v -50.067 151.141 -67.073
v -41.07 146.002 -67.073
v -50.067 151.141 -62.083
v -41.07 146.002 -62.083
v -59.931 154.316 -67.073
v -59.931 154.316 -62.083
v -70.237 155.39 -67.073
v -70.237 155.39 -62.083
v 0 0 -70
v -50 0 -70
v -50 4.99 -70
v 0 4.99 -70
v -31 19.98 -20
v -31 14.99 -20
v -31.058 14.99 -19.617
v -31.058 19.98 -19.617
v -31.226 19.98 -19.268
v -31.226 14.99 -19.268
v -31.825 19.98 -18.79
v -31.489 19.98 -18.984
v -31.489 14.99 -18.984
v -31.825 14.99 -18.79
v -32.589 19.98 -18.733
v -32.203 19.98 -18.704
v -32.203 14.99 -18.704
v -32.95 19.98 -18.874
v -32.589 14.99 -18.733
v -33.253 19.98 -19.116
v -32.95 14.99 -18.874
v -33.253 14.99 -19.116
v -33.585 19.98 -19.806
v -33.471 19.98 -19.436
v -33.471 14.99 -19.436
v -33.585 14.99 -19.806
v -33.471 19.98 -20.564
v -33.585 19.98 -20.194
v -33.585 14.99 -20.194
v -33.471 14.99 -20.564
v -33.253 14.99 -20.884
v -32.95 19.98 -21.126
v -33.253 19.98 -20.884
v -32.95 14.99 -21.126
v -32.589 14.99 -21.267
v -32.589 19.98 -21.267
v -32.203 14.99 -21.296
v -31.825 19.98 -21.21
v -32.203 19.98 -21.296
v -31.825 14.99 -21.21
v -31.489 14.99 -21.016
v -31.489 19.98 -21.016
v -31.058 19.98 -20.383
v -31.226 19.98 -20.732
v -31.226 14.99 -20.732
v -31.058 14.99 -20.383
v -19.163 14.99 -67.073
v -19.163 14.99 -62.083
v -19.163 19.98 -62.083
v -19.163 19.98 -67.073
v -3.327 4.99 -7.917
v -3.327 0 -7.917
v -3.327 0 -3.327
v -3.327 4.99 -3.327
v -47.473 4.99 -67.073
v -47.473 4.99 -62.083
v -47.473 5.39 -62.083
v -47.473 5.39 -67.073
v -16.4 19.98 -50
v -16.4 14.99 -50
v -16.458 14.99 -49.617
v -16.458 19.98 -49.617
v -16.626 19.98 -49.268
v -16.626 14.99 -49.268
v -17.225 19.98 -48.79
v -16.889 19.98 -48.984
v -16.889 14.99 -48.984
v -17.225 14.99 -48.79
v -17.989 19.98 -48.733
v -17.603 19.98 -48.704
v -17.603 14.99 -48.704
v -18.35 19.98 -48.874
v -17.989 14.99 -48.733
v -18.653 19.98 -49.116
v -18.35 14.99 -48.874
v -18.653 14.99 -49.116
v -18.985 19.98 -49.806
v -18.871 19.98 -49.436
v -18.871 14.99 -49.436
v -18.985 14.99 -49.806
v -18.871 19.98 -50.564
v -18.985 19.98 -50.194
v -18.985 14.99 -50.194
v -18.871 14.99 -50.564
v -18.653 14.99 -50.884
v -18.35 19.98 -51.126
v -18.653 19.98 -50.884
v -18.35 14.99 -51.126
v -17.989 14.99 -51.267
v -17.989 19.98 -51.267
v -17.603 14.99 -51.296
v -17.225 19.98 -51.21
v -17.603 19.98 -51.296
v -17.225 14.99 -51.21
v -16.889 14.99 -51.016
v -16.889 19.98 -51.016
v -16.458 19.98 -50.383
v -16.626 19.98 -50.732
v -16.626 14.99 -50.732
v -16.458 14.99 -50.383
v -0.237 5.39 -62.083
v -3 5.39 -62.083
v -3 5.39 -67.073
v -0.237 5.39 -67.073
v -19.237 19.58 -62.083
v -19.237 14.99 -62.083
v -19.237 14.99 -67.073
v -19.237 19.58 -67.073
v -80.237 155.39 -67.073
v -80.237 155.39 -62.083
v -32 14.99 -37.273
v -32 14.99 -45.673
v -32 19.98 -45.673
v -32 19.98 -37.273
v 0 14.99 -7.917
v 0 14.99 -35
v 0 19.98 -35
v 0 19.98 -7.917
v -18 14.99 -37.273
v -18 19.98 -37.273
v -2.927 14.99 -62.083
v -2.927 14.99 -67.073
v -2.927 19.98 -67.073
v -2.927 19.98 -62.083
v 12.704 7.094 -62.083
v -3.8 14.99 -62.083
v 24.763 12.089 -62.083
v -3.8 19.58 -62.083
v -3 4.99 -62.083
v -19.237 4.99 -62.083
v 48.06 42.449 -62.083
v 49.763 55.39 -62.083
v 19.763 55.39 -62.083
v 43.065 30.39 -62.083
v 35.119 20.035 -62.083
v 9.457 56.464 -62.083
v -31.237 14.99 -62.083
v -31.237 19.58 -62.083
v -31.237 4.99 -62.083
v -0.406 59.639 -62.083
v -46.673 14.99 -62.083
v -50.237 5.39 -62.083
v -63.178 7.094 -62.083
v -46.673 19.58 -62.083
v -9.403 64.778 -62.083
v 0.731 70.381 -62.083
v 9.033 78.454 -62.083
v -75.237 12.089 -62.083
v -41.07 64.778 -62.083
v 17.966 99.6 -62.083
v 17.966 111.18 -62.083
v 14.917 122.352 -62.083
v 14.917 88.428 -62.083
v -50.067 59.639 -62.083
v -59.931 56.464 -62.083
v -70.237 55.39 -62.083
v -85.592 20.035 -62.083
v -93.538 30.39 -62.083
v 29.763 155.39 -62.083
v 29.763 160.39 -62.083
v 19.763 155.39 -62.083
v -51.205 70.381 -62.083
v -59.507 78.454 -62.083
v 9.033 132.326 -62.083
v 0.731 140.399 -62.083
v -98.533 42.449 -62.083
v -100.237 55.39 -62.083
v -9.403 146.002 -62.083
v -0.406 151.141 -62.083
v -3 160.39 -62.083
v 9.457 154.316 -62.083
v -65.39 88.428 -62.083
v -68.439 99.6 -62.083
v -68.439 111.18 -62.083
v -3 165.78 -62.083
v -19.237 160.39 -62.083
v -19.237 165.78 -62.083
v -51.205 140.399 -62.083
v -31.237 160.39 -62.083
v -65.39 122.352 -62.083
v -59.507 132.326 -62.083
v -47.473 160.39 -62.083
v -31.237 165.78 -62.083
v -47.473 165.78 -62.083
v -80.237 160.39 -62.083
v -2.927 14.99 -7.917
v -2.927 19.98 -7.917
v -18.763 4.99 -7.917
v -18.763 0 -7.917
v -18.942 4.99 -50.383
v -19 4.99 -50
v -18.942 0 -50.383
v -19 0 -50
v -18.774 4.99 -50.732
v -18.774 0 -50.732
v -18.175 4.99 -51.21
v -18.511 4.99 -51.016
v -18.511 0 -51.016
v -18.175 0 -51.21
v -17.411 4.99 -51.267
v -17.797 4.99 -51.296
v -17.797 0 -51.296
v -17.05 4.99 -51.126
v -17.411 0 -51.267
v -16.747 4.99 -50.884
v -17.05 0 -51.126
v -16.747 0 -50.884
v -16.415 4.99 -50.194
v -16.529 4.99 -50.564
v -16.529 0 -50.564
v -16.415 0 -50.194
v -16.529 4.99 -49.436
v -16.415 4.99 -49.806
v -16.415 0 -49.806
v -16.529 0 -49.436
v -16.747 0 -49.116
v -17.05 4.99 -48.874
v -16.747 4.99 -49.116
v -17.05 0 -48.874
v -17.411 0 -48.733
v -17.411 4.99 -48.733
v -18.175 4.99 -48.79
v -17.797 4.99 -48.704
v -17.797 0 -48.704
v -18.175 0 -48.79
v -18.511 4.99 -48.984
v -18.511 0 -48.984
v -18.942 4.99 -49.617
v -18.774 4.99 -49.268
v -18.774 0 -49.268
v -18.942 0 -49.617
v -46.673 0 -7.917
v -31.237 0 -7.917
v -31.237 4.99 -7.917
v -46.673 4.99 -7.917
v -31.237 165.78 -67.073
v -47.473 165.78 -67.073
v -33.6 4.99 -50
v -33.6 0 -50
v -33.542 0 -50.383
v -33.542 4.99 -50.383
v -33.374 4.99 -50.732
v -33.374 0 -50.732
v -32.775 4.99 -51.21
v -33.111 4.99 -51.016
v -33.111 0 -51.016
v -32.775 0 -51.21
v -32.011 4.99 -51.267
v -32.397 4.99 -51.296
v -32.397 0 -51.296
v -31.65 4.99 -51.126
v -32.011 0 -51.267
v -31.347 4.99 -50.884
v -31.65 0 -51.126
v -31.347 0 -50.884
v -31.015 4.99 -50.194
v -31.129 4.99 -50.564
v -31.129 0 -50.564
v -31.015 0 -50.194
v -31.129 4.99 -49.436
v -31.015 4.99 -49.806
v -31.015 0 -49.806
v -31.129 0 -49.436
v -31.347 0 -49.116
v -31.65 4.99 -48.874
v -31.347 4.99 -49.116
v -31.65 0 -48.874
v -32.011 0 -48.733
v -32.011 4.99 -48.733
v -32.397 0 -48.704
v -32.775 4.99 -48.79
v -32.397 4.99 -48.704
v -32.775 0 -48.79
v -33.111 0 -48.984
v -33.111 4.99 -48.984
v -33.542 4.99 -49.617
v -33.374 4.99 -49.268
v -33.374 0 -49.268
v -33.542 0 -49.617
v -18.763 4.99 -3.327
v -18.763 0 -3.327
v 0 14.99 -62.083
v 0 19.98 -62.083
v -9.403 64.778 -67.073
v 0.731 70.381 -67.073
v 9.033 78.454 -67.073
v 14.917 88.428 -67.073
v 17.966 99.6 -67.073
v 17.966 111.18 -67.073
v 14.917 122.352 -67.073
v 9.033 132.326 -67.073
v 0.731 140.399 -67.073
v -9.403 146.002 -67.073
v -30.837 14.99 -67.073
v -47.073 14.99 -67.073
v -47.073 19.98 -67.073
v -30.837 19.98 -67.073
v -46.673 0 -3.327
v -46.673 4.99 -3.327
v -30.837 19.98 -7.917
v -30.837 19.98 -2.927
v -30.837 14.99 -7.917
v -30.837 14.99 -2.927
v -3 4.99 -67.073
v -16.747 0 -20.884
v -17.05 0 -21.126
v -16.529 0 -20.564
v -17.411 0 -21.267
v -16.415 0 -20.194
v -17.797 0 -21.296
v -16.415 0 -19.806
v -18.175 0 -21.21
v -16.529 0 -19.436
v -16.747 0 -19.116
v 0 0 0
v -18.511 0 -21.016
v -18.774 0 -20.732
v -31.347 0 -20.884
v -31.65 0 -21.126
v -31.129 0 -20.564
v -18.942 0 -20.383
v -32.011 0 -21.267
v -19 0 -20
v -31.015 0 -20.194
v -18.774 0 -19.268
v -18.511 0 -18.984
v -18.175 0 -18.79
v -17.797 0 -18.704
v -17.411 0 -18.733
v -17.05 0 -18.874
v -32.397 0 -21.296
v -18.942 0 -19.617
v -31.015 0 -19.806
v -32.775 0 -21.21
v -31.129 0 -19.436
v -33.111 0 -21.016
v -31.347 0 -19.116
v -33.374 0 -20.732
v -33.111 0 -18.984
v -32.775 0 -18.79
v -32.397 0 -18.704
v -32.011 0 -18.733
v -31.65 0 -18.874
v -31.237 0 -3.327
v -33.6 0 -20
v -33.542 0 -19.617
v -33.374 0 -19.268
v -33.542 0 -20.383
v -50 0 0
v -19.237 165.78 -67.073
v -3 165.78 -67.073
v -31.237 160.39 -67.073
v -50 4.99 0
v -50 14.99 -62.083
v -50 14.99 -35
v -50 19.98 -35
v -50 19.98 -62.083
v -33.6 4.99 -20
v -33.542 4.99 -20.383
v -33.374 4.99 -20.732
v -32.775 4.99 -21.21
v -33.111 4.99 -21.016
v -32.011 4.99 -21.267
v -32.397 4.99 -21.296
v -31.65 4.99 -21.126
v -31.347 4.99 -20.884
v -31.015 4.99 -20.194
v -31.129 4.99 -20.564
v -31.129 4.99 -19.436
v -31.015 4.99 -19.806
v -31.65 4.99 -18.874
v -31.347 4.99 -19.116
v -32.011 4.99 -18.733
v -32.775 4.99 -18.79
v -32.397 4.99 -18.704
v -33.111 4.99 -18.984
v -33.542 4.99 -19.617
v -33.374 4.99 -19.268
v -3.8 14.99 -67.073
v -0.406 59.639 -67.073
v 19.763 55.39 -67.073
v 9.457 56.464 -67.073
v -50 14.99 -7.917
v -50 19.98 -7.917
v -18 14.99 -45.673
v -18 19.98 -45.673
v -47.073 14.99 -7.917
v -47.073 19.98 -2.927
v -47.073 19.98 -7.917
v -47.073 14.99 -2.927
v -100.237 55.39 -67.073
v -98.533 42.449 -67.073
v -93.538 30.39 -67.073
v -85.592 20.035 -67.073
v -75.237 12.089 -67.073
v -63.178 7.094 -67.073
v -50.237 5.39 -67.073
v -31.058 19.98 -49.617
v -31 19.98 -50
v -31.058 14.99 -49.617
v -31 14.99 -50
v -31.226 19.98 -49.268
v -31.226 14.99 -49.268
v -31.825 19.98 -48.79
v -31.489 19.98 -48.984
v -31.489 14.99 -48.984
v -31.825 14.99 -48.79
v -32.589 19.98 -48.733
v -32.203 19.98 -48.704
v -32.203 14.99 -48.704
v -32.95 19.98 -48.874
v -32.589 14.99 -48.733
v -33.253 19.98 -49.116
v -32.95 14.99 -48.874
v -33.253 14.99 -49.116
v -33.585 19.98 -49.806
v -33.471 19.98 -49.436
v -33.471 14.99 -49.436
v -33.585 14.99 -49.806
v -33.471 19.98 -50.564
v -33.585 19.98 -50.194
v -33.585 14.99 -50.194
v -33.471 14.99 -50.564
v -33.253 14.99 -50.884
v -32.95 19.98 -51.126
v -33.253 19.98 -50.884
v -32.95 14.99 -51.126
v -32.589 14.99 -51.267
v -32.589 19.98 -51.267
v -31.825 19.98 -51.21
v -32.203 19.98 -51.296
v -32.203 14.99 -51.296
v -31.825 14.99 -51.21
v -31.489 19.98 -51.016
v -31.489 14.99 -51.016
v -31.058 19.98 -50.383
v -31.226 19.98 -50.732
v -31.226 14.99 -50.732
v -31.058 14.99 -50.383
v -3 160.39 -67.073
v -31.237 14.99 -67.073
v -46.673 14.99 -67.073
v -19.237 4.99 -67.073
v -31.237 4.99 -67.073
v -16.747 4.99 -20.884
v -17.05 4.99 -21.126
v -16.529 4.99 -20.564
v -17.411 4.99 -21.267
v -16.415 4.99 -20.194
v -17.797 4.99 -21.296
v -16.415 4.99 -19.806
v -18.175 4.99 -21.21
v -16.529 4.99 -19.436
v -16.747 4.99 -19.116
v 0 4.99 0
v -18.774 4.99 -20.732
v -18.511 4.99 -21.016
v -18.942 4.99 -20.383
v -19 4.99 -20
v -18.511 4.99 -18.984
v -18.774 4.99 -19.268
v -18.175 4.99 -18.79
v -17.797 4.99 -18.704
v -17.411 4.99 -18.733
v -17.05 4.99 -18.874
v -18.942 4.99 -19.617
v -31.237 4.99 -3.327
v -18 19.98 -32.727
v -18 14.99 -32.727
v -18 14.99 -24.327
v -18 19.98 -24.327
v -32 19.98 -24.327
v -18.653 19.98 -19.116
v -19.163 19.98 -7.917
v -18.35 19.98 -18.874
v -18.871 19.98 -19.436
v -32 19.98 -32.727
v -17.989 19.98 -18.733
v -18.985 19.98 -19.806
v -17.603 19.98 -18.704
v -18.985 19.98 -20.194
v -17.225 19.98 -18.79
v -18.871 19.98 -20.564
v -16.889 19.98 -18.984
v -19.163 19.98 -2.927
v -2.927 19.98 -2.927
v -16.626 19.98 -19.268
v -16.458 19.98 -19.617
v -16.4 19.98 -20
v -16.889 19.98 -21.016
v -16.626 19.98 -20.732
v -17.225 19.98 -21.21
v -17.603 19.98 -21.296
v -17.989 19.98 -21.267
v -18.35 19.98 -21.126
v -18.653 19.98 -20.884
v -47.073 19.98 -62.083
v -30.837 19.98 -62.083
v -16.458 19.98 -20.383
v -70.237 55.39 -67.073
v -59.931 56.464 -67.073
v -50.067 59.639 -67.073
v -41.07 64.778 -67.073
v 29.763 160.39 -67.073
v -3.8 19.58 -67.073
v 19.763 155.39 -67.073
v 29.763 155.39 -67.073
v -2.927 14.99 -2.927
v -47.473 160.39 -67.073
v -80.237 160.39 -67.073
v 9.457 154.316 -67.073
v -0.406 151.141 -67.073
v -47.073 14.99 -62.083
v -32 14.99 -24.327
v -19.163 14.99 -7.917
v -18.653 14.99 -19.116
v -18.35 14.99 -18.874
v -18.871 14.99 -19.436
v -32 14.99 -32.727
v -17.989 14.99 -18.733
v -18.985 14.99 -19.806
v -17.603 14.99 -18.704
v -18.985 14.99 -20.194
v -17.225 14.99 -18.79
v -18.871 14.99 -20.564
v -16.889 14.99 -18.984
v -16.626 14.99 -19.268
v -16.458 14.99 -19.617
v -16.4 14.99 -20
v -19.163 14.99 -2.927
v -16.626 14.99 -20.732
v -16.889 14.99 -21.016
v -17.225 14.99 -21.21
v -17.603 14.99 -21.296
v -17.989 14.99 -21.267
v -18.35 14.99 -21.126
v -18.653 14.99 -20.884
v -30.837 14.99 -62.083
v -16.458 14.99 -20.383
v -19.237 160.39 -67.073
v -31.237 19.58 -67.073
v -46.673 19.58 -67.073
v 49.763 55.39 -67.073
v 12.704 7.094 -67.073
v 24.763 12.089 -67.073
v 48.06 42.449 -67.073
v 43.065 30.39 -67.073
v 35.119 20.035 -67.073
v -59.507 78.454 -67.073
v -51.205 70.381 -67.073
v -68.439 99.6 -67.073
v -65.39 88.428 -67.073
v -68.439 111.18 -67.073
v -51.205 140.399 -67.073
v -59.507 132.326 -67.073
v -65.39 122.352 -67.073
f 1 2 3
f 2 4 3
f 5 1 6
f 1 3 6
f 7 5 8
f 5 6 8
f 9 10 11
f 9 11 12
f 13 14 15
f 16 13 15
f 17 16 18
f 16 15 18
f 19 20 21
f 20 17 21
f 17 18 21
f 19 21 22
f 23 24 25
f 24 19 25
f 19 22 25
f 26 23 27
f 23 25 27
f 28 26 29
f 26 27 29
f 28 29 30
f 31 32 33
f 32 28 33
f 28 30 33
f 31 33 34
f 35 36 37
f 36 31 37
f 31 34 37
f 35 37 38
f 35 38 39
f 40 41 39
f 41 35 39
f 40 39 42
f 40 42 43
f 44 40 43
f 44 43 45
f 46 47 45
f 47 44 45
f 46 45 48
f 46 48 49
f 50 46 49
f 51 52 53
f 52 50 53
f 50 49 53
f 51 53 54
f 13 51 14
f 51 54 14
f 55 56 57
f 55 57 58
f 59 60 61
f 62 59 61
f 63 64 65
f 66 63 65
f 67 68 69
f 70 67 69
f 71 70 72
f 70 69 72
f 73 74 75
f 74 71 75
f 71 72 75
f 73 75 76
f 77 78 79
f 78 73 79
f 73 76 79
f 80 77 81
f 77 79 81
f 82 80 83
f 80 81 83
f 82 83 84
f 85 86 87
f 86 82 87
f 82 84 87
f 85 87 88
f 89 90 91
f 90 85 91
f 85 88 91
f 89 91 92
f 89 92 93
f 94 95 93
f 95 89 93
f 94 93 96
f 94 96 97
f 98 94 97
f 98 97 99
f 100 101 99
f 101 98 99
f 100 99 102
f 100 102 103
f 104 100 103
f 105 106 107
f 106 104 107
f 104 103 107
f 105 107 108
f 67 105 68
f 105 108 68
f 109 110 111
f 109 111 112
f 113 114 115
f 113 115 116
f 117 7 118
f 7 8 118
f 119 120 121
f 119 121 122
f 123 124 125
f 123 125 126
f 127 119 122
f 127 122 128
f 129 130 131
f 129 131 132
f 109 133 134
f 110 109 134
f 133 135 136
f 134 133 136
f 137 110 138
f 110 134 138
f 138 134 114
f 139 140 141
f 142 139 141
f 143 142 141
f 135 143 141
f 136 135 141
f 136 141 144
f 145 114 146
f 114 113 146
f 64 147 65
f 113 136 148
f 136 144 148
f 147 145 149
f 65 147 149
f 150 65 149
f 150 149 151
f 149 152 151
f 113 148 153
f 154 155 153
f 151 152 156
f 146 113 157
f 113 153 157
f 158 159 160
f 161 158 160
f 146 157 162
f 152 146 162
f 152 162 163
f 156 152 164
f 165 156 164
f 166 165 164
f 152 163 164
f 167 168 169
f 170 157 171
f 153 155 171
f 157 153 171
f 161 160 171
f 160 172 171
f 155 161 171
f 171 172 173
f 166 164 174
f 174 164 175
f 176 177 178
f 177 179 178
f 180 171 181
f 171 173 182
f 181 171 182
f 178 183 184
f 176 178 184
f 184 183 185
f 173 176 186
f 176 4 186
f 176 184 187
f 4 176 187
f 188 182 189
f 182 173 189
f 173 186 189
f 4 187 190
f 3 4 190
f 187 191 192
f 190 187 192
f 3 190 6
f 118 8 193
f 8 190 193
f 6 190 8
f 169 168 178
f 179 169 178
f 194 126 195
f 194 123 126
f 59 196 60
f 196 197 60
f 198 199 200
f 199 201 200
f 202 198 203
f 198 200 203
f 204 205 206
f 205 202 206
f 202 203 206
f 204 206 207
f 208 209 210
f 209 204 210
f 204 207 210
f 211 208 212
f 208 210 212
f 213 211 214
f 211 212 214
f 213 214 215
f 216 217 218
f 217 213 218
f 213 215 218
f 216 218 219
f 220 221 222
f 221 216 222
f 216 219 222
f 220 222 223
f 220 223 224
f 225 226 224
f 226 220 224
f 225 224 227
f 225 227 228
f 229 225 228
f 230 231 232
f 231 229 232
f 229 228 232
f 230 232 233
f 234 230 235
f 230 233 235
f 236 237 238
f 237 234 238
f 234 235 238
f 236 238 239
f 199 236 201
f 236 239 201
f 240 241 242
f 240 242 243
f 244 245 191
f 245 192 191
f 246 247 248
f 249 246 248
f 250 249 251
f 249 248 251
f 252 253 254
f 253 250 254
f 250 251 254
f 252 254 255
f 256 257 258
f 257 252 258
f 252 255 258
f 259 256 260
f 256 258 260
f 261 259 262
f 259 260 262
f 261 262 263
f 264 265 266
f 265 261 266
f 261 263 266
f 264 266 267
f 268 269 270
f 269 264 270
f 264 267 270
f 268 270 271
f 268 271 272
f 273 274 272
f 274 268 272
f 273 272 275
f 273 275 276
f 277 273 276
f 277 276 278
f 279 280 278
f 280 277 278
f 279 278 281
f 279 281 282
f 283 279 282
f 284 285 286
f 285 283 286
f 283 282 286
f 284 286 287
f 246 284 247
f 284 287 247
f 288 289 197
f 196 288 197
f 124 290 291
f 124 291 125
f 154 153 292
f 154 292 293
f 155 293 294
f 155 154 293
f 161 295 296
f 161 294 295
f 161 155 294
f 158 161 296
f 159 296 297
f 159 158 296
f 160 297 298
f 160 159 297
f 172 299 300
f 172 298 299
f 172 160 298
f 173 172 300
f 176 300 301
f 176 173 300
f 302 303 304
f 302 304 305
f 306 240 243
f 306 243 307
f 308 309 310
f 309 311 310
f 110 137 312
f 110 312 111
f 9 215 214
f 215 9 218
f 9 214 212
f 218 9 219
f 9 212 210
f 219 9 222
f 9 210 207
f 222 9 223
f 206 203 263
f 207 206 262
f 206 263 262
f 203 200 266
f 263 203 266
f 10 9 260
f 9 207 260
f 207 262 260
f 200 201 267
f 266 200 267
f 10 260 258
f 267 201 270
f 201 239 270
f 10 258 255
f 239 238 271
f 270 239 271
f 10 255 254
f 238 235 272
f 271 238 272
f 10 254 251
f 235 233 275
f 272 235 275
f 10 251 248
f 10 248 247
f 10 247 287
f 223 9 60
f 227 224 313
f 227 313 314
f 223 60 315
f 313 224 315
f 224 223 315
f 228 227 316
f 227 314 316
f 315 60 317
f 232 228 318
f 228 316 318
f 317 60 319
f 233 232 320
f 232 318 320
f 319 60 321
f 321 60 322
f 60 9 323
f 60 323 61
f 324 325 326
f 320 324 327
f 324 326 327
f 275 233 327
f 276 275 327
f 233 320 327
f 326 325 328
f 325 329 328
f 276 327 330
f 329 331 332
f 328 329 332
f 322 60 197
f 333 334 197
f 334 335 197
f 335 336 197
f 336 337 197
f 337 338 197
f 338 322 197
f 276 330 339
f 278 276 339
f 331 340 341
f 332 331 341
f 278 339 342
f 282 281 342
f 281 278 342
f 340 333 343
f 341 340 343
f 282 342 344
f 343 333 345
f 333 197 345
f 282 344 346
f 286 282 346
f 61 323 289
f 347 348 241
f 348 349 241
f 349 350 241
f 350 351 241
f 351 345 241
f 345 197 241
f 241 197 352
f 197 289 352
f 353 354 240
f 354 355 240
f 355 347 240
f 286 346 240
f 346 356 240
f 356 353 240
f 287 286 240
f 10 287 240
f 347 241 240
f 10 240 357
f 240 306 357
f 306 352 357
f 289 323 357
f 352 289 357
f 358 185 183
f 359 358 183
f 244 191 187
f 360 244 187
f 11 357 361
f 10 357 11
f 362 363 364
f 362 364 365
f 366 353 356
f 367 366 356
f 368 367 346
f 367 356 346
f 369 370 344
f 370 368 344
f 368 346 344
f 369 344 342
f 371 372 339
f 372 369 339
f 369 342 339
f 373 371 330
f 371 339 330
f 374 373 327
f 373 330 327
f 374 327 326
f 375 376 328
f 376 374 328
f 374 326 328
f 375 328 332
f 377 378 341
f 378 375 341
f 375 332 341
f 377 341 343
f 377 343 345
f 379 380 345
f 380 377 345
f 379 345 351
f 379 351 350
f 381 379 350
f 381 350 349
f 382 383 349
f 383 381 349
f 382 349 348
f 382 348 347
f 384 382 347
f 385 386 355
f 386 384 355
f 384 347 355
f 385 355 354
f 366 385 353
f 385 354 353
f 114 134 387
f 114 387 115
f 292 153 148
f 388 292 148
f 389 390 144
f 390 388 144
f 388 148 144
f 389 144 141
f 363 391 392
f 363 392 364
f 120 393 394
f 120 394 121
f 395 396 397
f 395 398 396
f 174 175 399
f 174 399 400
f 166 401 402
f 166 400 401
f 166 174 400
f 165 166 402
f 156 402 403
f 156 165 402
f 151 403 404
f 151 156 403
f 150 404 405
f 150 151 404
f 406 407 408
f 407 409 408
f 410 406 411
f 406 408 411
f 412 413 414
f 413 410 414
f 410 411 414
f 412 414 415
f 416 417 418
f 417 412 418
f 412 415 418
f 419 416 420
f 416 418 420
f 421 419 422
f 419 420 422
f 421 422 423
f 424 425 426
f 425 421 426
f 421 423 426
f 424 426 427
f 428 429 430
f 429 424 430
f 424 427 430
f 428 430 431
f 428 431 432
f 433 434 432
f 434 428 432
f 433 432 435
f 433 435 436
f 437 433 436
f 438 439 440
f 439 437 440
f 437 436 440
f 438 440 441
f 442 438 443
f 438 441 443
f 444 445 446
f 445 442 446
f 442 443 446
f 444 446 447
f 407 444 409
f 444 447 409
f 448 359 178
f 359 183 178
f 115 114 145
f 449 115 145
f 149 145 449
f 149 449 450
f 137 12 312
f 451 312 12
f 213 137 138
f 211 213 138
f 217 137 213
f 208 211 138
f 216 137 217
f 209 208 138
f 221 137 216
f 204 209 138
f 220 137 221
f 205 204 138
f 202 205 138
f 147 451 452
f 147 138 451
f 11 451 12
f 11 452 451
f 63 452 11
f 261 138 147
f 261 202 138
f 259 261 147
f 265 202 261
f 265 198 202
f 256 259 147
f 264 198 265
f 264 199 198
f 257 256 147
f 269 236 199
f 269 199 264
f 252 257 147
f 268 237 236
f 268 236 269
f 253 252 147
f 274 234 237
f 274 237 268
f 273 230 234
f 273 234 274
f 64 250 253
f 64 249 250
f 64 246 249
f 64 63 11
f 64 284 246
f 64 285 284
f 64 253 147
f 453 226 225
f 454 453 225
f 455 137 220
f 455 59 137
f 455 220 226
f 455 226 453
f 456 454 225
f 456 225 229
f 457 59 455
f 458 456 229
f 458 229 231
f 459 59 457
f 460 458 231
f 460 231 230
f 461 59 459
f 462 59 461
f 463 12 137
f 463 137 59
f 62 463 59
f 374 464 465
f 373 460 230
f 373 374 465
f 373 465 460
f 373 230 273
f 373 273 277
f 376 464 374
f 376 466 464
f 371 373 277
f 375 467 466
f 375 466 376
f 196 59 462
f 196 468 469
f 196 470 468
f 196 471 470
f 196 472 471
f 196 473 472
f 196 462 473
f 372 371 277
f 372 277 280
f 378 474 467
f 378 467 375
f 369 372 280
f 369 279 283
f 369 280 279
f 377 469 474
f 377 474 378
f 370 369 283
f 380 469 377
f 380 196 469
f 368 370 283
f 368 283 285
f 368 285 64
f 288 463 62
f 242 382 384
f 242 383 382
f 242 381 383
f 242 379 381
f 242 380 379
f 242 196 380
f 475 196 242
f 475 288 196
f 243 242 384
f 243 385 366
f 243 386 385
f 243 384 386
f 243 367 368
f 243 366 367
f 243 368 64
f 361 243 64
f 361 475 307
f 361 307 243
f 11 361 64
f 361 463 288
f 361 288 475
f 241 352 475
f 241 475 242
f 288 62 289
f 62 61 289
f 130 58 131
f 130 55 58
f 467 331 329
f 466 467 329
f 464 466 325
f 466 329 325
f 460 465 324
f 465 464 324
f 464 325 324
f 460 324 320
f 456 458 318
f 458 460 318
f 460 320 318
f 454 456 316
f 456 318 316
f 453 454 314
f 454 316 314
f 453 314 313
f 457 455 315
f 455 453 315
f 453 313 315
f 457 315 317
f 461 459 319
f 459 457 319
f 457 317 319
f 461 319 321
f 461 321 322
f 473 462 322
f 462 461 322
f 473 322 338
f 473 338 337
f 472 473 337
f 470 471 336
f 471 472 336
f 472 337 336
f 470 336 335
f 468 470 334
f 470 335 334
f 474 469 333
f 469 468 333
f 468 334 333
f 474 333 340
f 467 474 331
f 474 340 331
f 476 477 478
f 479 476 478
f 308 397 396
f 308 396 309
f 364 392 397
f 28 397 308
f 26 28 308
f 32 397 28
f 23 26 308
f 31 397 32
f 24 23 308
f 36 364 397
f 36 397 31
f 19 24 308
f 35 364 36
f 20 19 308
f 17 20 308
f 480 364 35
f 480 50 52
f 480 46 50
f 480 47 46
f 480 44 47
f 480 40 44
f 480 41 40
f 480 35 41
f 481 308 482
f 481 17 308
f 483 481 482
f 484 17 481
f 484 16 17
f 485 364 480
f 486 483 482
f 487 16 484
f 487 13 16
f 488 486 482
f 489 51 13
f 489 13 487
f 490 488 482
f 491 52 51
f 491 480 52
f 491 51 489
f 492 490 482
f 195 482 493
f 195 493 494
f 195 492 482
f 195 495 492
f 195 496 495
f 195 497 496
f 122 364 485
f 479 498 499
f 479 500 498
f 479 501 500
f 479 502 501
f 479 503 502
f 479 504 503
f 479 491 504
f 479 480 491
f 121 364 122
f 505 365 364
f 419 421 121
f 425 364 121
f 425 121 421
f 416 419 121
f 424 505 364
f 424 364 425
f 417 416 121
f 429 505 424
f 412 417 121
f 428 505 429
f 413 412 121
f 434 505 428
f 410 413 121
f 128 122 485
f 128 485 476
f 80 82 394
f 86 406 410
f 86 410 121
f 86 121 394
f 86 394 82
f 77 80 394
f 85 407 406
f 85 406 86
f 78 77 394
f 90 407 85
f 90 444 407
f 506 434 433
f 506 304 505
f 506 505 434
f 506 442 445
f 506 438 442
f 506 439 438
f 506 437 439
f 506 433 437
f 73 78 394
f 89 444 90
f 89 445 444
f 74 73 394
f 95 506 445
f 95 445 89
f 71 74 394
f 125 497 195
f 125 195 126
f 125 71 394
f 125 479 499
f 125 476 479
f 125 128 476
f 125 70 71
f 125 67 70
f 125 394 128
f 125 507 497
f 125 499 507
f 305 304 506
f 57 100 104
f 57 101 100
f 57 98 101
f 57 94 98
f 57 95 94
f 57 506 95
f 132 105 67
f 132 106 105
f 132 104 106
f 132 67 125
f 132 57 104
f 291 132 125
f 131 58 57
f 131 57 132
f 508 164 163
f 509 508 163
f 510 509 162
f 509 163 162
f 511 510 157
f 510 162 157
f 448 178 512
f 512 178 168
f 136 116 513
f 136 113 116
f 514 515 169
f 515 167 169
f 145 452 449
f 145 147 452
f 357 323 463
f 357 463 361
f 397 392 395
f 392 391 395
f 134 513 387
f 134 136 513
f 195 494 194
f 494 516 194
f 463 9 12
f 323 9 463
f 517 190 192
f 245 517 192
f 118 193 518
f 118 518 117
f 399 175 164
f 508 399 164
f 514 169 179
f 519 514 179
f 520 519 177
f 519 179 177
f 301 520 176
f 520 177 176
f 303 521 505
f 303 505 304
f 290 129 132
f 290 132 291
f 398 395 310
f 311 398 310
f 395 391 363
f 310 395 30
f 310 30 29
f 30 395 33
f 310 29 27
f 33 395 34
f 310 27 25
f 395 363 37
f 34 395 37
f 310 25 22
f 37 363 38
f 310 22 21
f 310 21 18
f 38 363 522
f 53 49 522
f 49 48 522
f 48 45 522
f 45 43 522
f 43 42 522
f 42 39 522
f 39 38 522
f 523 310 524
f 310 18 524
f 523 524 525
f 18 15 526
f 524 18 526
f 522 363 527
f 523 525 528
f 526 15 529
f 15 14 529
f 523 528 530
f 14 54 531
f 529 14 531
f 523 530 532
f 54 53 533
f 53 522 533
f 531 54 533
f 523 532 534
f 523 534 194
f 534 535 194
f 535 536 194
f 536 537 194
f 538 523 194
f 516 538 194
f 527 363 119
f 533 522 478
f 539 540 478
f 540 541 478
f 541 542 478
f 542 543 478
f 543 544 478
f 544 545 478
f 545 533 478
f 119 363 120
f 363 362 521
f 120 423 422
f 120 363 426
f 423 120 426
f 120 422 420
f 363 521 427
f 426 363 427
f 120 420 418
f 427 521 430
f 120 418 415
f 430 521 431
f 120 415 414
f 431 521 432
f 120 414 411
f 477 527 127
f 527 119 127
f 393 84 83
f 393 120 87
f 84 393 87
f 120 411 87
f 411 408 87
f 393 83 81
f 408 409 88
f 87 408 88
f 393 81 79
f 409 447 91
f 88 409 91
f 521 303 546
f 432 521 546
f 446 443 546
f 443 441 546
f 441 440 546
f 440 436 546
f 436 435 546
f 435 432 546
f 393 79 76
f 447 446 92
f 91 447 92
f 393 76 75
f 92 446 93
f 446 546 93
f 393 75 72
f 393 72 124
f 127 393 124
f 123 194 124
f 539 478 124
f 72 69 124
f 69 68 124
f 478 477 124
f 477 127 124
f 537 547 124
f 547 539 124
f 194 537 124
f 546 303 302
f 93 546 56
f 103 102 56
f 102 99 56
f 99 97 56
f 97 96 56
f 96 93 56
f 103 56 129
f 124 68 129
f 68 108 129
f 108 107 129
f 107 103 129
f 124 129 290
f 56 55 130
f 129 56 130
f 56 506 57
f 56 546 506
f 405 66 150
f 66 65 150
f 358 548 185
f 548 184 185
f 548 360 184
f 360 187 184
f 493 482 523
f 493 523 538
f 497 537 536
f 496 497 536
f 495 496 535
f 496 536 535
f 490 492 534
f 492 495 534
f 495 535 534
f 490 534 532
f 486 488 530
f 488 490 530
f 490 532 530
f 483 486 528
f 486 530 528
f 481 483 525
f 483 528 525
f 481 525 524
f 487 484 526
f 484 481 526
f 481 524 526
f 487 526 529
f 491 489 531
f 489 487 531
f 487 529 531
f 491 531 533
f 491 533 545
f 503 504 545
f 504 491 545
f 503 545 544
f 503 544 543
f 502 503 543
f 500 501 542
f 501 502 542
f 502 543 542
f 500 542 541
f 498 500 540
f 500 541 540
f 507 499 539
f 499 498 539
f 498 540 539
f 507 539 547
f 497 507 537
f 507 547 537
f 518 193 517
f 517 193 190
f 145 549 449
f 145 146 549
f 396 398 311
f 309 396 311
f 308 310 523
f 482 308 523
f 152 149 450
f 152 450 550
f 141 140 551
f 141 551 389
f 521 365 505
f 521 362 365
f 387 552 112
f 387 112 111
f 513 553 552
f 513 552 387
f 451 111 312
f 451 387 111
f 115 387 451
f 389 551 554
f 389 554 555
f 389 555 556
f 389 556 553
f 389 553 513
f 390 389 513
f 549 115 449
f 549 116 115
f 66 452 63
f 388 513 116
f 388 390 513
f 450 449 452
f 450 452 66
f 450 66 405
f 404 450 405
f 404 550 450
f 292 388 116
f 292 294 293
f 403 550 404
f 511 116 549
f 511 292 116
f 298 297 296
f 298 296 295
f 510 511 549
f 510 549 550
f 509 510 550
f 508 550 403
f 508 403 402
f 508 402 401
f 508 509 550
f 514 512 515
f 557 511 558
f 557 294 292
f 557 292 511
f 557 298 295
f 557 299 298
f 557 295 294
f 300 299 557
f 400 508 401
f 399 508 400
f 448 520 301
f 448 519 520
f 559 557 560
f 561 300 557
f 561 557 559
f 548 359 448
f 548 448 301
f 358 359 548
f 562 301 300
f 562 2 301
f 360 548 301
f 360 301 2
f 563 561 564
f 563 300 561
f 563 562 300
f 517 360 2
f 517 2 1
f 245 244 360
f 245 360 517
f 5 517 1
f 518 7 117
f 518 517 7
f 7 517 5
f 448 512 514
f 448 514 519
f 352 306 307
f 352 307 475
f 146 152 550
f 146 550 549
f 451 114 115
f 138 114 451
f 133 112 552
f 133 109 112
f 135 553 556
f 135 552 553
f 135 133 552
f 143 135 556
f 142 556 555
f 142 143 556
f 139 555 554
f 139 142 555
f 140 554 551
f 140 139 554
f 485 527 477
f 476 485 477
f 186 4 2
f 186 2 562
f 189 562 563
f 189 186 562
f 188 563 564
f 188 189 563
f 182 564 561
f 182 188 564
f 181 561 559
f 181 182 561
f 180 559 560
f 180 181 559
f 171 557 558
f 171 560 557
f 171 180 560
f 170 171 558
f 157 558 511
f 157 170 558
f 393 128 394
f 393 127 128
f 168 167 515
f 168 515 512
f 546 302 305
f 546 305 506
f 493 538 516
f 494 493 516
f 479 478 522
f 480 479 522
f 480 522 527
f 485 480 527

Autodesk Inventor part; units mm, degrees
ref_plane "YZ Plane" through (0, 0, 0) normal (1, 0, 0) x (0, 1, 0)
ref_plane "XZ Plane" through (0, 0, 0) normal (0, 1, 0) x (-1, 0, 0)
ref_plane "XY Plane" through (0, 0, 0) normal (0, 0, 1) x (1, 0, 0)
sketch "Sketch1" plane through (0, 0, 0) normal (0, 1, 0) x (-1, 0, 0)
  line L0 (0, 0) -> (50, 0)
  line L1 (50, 0) -> (50, -70)
  line L2 (50, -70) -> (0, -70)
  line L3 (0, -70) -> (0, 0)
  line L4 (25, 0) -> (25, -70) construction
  line L5 (31, -70) -> (19, -70) construction
  line L6 (19, -70) -> (19, 0) construction
  line L7 (19, 0) -> (31, 0) construction
  line L8 (31, 0) -> (31, -70) construction
  line L9 (31, -70) -> (19, -70) construction
  line L10 (19, -70) -> (19, -41.2) construction
  line L11 (19, -41.2) -> (31, -41.2) construction
  line L12 (31, -41.2) -> (31, -70) construction
  line L13 (31, 0) -> (19, 0) construction
  line L14 (19, 0) -> (19, -28.8) construction
  line L15 (19, -28.8) -> (31, -28.8) construction
  line L16 (31, -28.8) -> (31, 0) construction
  line L17 (46.6733, -3.3267) -> (3.3267, -3.3267) construction
  line L18 (3.3267, -3.3267) -> (3.3267, -66.6733) construction
  line L19 (3.3267, -66.6733) -> (46.6733, -66.6733) construction
  line L20 (46.6733, -66.6733) -> (46.6733, -3.3267) construction
  line L21 (46.6733, -3.3267) -> (31.2367, -3.3267)
  line L22 (31.2367, -3.3267) -> (31.2367, -7.9167)
  line L23 (31.2367, -7.9167) -> (46.6733, -7.9167)
  line L24 (46.6733, -7.9167) -> (46.6733, -3.3267)
  line L25 (46.6733, -66.6733) -> (31.2367, -66.6733)
  line L26 (31.2367, -66.6733) -> (31.2367, -62.0833)
  line L27 (31.2367, -62.0833) -> (46.6733, -62.0833)
  line L28 (46.6733, -62.0833) -> (46.6733, -66.6733)
  line L29 (3.3267, -66.6733) -> (18.7633, -66.6733)
  line L30 (18.7633, -66.6733) -> (18.7633, -62.0833)
  line L31 (18.7633, -62.0833) -> (3.3267, -62.0833)
  line L32 (3.3267, -62.0833) -> (3.3267, -66.6733)
  line L33 (3.3267, -3.3267) -> (18.7633, -3.3267)
  line L34 (18.7633, -3.3267) -> (18.7633, -7.9167)
  line L35 (18.7633, -7.9167) -> (3.3267, -7.9167)
  line L36 (3.3267, -7.9167) -> (3.3267, -3.3267)
  circle A0 centre (17.7, -20) radius 1.3
  circle A1 centre (32.3, -20) radius 1.3
  circle A2 centre (32.3, -50) radius 1.3
  circle A3 centre (17.7, -50) radius 1.3
  dimension "d0" = 70
  dimension "d1" = 50
  dimension "d6" = 12
  dimension "d8" = 28.8
  dimension "d10" = 28.8
  dimension "d16" = 3.3267
  dimension "d17" = 3.3267
  dimension "d18" = 3.3267
  dimension "d19" = 3.3267
  dimension "d20" = 4.59
  dimension "d21" = 15.4367
  dimension "visse_dist" = 20
  dimension "d26" = 2.6
  dimension "d27" = 20
  dimension "d28" = 20
  dimension "d29" = 20
extrude "Extrusion2" add sketch "Sketch1" along normal blind 4.99
ref_plane "Work Plane1" through (0, 14.99, 0) normal (0, 1, 0) x (1, 0, 0)
ref_plane "Work Plane2" through (-31.2367, 0, -62.0833) normal (0, 0, -1) x (-1, 0, 0)
sketch "Sketch3" plane through (-31.2367, 0, -62.0833) normal (0, 0, -1) x (-1, 0, 0)
  line L0 (0, 0) -> (16.2367, 0)
  line L1 (16.2367, 0) -> (16.2367, 5.39)
  line L2 (16.2367, 5.39) -> (19, 5.39)
  line L3 (0, 0) -> (0, 5.39)
  line L4 (0, 5.39) -> (-12, 5.39) construction
  line L5 (-12, 5.39) -> (-12, 0)
  line L6 (-12, 0) -> (-28.2367, 0)
  line L7 (-28.2367, 0) -> (-28.2367, 5.39)
  line L8 (-28.2367, 5.39) -> (-31, 5.39)
  arc A0 (19, 5.39) -> (69, 55.39) centre (19, 55.39) ccw
  line L9 (19, 55.39) -> (69, 55.39) construction
  arc A1 (-81, 55.39) -> (-31, 5.39) centre (-31, 55.39) ccw
  line L10 (-81, 55.39) -> (-31, 55.39) construction
  line L11 (-81, 55.39) -> (-51, 55.39)
  line L12 (69, 55.39) -> (39, 55.39)
  line L13 (-61, 155.39) -> (-51, 155.39)
  arc A2 (39, 155.39) -> (9.8333, 146.0016) centre (39, 105.39) ccw
  arc A3 (-51, 55.39) -> (-21.8333, 64.7784) centre (-51, 105.39) ccw
  line L14 (-51, 105.39) -> (39, 105.39) construction
  arc A4 (-21.8333, 146.0016) -> (-21.8333, 64.7784) centre (-6, 105.39) ccw
  arc A5 (-21.8333, 146.0016) -> (-51, 155.39) centre (-51, 105.39) ccw
  arc A6 (9.8333, 146.0016) -> (9.8333, 64.7784) centre (39, 105.39) ccw construction
  arc A7 (9.8333, 64.7784) -> (39, 55.39) centre (39, 105.39) ccw
  arc A8 (-21.8333, 64.7784) -> (-21.8333, 146.0016) centre (-51, 105.39) ccw construction
  arc A9 (9.8333, 146.0016) -> (-21.8333, 146.0016) centre (-6, 105.39) ccw construction
  arc A10 (9.8333, 64.7784) -> (9.8333, 146.0016) centre (-6, 105.39) ccw
  arc A11 (-21.8333, 64.7784) -> (9.8333, 64.7784) centre (-6, 105.39) ccw construction
  line L15 (-51, 155.39) -> (39, 155.39) construction
  line L16 (39, 155.39) -> (49, 155.39)
  line L17 (-61, 155.39) -> (-61, 160.39)
  line L18 (49, 160.39) -> (49, 155.39)
  line L19 (49, 160.39) -> (16.2367, 160.39)
  line L20 (16.2367, 160.39) -> (16.2367, 165.78)
  line L21 (16.2367, 165.78) -> (0, 165.78)
  line L22 (0, 165.78) -> (0, 160.39)
  line L23 (0, 160.39) -> (-12, 160.39)
  line L24 (-12, 160.39) -> (-12, 165.78)
  line L25 (-12, 165.78) -> (-28.2367, 165.78)
  line L26 (-28.2367, 165.78) -> (-28.2367, 160.39)
  line L27 (-28.2367, 160.39) -> (-61, 160.39)
  line L28 (-27.4367, 14.99) -> (-12, 14.99)
  line L29 (-12, 14.99) -> (-12, 19.58)
  line L30 (-12, 19.58) -> (-27.4367, 19.58)
  line L31 (-27.4367, 19.58) -> (-27.4367, 14.99)
  line L32 (0, 14.99) -> (15.4367, 14.99)
  line L33 (15.4367, 14.99) -> (15.4367, 19.58)
  line L34 (15.4367, 19.58) -> (0, 19.58)
  line L35 (0, 19.58) -> (0, 14.99)
  line L36 (-125.4975, 14.99) -> (113.4975, 14.99) construction
  line L37 (-12, 14.99) -> (0, 14.99) construction
  line L38 (-12, 17.285) -> (0, 17.285) construction
  line L39 (-12, 5.39) -> (-12, 14.99)
  line L40 (-12, 14.99) -> (0, 14.99)
  line L41 (0, 14.99) -> (0, 5.39)
  point P0 (-31.2367, 0)
  point P1 (-6, 5.39)
  point P2 (-6, 83.5955)
  point P3 (-28.2367, 14.99)
  point P4 (16.2367, 14.99)
  point P5 (-6, 14.99)
  point P6 (-6, 17.285)
  point P7 (18.7633, 4.99)
  dimension "d34" = 16.2367
  dimension "d35" = 5.39
  dimension "d36" = 12
  dimension "d37" = 50
  dimension "body_extra_r" = 50
  dimension "body_angle" = 90
  dimension "d42" = 50
  dimension "d43" = 90
  dimension "d45" = 150
  dimension "extra_flat" = 30
  dimension "d48" = 21.7945
  dimension "d49" = 87.178
  dimension "d50" = 10
  dimension "d51" = 5
  dimension "d65" = 4.59
  dimension "d66" = 15.4367
  dimension "d67" = 3.3267
  dimension "d68" = 9.6
sketch "Sketch4" plane through (-31.2367, 0, -62.0833) normal (0, 0, -1) x (-1, 0, 0)
  point P0 (-31.2367, 0)
sketch "Sketch5" plane through (0, 14.99, 0) normal (0, 1, 0) x (1, 0, 0)
  line L0 (0, 0) -> (0, 70) construction
  line L1 (0, 62.0833) -> (0, 35) construction
  line L2 (-50, 0) -> (0, 0) construction
  line L3 (-50, 70) -> (-50, 0) construction
  line L4 (-50, 7.9167) -> (-50, 35)
  line L5 (-46.6733, 7.9167) -> (-31.2367, 7.9167) construction
  line L6 (-18.7633, 7.9167) -> (-3.3267, 7.9167) construction
  line L7 (0, 70) -> (-50, 70) construction
  line L8 (-50, 7.9167) -> (0, 7.9167) construction
  line L9 (-3.3267, 7.9167) -> (-18.7633, 7.9167) construction
  line L10 (-50, 7.9167) -> (-47.0733, 7.9167)
  line L11 (-47.0733, 2.9267) -> (-30.8367, 2.9267)
  line L12 (-30.8367, 2.9267) -> (-30.8367, 7.9167)
  line L13 (-19.1633, 7.9167) -> (-19.1633, 2.9267)
  line L14 (-19.1633, 2.9267) -> (-2.9267, 2.9267)
  line L15 (-47.0733, 2.9267) -> (-47.0733, 7.9167)
  line L16 (-30.8367, 7.9167) -> (-19.1633, 7.9167)
  line L17 (-46.6733, 3.3267) -> (-46.6733, 7.9167) construction
  line L18 (-31.2367, 7.9167) -> (-31.2367, 3.3267) construction
  line L19 (-18.7633, 3.3267) -> (-18.7633, 7.9167) construction
  line L20 (-3.3267, 7.9167) -> (-3.3267, 3.3267) construction
  line L21 (-46.6733, 5.6217) -> (-31.2367, 5.6217) construction
  line L22 (-18.7633, 7.9167) -> (-18.7633, 3.3267) construction
  line L23 (-18.7633, 5.6217) -> (-3.3267, 5.6217) construction
  line L24 (-2.9267, 2.9267) -> (-2.9267, 7.9167)
  line L25 (0, 7.9167) -> (-2.9267, 7.9167)
  line L26 (-50, 35) -> (0, 35) construction
  line L27 (-50, 35) -> (-50, 62.0833) construction
  line L28 (0, 35) -> (0, 7.9167)
  line L29 (-50, 35) -> (-50, 57.515) construction
  line L30 (-50, 35) -> (-50, 35)
  line L31 (-3.3267, 62.0833) -> (-18.7633, 62.0833) construction
  line L32 (-11.045, 62.0833) -> (-11.045, 7.9167) construction
  line L33 (-50, 35) -> (-50, 62.0833)
  line L34 (-50, 62.0833) -> (-47.0733, 62.0833)
  line L35 (-47.0733, 62.0833) -> (-47.0733, 67.0733)
  line L36 (-47.0733, 67.0733) -> (-30.8367, 67.0733)
  line L37 (-30.8367, 67.0733) -> (-30.8367, 62.0833)
  line L38 (-30.8367, 62.0833) -> (-19.1633, 62.0833)
  line L39 (-19.1633, 62.0833) -> (-19.1633, 67.0733)
  line L40 (-19.1633, 67.0733) -> (-2.9267, 67.0733)
  line L41 (-2.9267, 67.0733) -> (-2.9267, 62.0833)
  line L42 (-2.9267, 62.0833) -> (0, 62.0833)
  line L43 (0, 62.0833) -> (0, 35)
  circle A0 centre (-32.3, 20) radius 1.3 projected
  circle A1 centre (-32.3, 50) radius 1.3 projected
  circle A2 centre (-17.7, 50) radius 1.3 projected
  circle A3 centre (-17.7, 20) radius 1.3 projected
  line L44 (-32, 32.7267) -> (-18, 32.7267)
  line L45 (-18, 32.7267) -> (-18, 24.3267)
  line L46 (-18, 24.3267) -> (-32, 24.3267)
  line L47 (-32, 24.3267) -> (-32, 32.7267)
  line L48 (-50, 31.7267) -> (0, 31.7267) construction
  line L49 (-32, 37.2733) -> (-18, 37.2733)
  line L50 (-18, 37.2733) -> (-18, 45.6733)
  line L51 (-18, 45.6733) -> (-32, 45.6733)
  line L52 (-32, 45.6733) -> (-32, 37.2733)
  point P0 (-25, 7.9167)
  point P1 (-38.955, 5.6217)
  point P2 (-38.955, 2.9267)
  point P3 (-11.045, 5.6217)
  point P4 (-11.045, 2.9267)
  point P5 (-11.045, 35)
  point P6 (-25, 24.3267)
  point P7 (-25, 7.9167)
  point P8 (-32, 28.5267)
  dimension "d55" = 4.99
  dimension "d56" = 16.2367
  dimension "d57" = 14
  dimension "d58" = 8.4
  dimension "d61" = 28.8
  dimension "motor_margin" = 1
extrude "Extrusion4" add sketch "Sketch5" along normal blind 4.99 separate body
extrude "Extrusion5" add sketch "Sketch3" along normal blind 4.99 bodies 1
equation "\"d0\" = base_L"
equation "\"d1\" = base_l"
equation "\"d6\" = motor_width"
equation "\"d8\" = extrud1 + extrud3"
equation "\"d10\" = d8"
equation "\"d16\" = extra_wood"
equation "\"d17\" = d16"
equation "\"d18\" = d16"
equation "\"d19\" = d17"
equation "\"d20\" = fente_l"
equation "\"d21\" = fente_L"
equation "\"d26\" = vis_moteur_d"
equation "\"d27\" = visse_dist"
equation "\"d28\" = visse_dist"
equation "\"d29\" = visse_dist"
equation "\"d30\" = thick"
equation "\"d34\" = male_L"
equation "\"d35\" = male_l"
equation "\"d36\" = motor_width"
equation "\"d37\" = base_l"
equation "\"d42\" = body_extra_r"
equation "\"d43\" = body_angle"
equation "\"base_L\" = 70"
equation "\"base_l\" = 50"
equation "\"motor_width\" = 12"
equation "\"extrud1\" = 22.4"
equation "\"extrud3\" = 6.4"
equation "\"extra_wood\" = 3.326667"
equation "\"fente_l\" = 4.59"
equation "\"fente_L\" = 15.436667"
equation "\"vis_moteur_d\" = 2.6"
equation "\"thick\" = 4.99"
equation "\"male_L\" = 16.236667"
equation "\"male_l\" = 5.39"
properties part number "new_base"
